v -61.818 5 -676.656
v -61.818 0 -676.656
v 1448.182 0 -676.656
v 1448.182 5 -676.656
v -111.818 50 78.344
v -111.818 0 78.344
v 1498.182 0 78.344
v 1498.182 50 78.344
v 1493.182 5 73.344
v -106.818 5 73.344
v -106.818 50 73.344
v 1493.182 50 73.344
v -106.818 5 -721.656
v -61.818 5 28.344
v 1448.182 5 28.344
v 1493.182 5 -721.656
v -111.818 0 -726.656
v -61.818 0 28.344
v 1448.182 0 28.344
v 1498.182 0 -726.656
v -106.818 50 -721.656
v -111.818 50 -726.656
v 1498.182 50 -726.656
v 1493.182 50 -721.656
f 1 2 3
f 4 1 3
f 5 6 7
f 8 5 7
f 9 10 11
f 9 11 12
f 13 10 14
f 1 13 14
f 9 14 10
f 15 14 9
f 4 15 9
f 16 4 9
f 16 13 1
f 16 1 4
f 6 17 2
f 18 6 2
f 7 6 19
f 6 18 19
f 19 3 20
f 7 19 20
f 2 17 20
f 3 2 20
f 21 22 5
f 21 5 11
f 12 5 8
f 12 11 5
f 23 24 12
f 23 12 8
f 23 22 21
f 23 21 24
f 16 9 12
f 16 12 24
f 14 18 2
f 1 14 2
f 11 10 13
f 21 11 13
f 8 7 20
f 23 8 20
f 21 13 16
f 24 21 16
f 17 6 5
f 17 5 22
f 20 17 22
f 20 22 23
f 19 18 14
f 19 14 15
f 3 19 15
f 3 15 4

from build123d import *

# Parameters (mm, degrees)
SKETCH_1_W      = 1610
SKETCH_1_H      = 805
SKETCH_1_W_2    = 1600
SKETCH_1_H_2    = 795
EXTRUDE_1_DEPTH = 50
SKETCH_1_7_W    = 1600
SKETCH_1_7_H    = 795
SKETCH_1_7_W_2  = 1510
SKETCH_1_7_H_2  = 705
EXTRUDE_2_DEPTH = 5


with BuildPart() as part:
    # Эскиз1 → Бобышка-Вытянуть1 (new body)
    with BuildSketch(Plane(origin=(0, 0, 0), x_dir=(1, 0, 0), z_dir=(0, 1, 0))):
        with Locations((693.181818182, 324.156044294)):
            Rectangle(SKETCH_1_W, SKETCH_1_H)
        with Locations((693.181818182, 324.156044294)):
            Rectangle(SKETCH_1_W_2, SKETCH_1_H_2, mode=Mode.SUBTRACT)
    extrude(amount=EXTRUDE_1_DEPTH)

    # Эскиз1<7> → Бобышка-Вытянуть2 (add)
    with BuildSketch(Plane(origin=(0, 0, 0), x_dir=(1, 0, 0), z_dir=(0, 1, 0))):
        with Locations((693.181818182, 324.156044294)):
            Rectangle(SKETCH_1_7_W, SKETCH_1_7_H)
        with Locations((693.181818182, 324.156044294)):
            Rectangle(SKETCH_1_7_W_2, SKETCH_1_7_H_2, mode=Mode.SUBTRACT)
    extrude(amount=EXTRUDE_2_DEPTH)


solid = part.part
